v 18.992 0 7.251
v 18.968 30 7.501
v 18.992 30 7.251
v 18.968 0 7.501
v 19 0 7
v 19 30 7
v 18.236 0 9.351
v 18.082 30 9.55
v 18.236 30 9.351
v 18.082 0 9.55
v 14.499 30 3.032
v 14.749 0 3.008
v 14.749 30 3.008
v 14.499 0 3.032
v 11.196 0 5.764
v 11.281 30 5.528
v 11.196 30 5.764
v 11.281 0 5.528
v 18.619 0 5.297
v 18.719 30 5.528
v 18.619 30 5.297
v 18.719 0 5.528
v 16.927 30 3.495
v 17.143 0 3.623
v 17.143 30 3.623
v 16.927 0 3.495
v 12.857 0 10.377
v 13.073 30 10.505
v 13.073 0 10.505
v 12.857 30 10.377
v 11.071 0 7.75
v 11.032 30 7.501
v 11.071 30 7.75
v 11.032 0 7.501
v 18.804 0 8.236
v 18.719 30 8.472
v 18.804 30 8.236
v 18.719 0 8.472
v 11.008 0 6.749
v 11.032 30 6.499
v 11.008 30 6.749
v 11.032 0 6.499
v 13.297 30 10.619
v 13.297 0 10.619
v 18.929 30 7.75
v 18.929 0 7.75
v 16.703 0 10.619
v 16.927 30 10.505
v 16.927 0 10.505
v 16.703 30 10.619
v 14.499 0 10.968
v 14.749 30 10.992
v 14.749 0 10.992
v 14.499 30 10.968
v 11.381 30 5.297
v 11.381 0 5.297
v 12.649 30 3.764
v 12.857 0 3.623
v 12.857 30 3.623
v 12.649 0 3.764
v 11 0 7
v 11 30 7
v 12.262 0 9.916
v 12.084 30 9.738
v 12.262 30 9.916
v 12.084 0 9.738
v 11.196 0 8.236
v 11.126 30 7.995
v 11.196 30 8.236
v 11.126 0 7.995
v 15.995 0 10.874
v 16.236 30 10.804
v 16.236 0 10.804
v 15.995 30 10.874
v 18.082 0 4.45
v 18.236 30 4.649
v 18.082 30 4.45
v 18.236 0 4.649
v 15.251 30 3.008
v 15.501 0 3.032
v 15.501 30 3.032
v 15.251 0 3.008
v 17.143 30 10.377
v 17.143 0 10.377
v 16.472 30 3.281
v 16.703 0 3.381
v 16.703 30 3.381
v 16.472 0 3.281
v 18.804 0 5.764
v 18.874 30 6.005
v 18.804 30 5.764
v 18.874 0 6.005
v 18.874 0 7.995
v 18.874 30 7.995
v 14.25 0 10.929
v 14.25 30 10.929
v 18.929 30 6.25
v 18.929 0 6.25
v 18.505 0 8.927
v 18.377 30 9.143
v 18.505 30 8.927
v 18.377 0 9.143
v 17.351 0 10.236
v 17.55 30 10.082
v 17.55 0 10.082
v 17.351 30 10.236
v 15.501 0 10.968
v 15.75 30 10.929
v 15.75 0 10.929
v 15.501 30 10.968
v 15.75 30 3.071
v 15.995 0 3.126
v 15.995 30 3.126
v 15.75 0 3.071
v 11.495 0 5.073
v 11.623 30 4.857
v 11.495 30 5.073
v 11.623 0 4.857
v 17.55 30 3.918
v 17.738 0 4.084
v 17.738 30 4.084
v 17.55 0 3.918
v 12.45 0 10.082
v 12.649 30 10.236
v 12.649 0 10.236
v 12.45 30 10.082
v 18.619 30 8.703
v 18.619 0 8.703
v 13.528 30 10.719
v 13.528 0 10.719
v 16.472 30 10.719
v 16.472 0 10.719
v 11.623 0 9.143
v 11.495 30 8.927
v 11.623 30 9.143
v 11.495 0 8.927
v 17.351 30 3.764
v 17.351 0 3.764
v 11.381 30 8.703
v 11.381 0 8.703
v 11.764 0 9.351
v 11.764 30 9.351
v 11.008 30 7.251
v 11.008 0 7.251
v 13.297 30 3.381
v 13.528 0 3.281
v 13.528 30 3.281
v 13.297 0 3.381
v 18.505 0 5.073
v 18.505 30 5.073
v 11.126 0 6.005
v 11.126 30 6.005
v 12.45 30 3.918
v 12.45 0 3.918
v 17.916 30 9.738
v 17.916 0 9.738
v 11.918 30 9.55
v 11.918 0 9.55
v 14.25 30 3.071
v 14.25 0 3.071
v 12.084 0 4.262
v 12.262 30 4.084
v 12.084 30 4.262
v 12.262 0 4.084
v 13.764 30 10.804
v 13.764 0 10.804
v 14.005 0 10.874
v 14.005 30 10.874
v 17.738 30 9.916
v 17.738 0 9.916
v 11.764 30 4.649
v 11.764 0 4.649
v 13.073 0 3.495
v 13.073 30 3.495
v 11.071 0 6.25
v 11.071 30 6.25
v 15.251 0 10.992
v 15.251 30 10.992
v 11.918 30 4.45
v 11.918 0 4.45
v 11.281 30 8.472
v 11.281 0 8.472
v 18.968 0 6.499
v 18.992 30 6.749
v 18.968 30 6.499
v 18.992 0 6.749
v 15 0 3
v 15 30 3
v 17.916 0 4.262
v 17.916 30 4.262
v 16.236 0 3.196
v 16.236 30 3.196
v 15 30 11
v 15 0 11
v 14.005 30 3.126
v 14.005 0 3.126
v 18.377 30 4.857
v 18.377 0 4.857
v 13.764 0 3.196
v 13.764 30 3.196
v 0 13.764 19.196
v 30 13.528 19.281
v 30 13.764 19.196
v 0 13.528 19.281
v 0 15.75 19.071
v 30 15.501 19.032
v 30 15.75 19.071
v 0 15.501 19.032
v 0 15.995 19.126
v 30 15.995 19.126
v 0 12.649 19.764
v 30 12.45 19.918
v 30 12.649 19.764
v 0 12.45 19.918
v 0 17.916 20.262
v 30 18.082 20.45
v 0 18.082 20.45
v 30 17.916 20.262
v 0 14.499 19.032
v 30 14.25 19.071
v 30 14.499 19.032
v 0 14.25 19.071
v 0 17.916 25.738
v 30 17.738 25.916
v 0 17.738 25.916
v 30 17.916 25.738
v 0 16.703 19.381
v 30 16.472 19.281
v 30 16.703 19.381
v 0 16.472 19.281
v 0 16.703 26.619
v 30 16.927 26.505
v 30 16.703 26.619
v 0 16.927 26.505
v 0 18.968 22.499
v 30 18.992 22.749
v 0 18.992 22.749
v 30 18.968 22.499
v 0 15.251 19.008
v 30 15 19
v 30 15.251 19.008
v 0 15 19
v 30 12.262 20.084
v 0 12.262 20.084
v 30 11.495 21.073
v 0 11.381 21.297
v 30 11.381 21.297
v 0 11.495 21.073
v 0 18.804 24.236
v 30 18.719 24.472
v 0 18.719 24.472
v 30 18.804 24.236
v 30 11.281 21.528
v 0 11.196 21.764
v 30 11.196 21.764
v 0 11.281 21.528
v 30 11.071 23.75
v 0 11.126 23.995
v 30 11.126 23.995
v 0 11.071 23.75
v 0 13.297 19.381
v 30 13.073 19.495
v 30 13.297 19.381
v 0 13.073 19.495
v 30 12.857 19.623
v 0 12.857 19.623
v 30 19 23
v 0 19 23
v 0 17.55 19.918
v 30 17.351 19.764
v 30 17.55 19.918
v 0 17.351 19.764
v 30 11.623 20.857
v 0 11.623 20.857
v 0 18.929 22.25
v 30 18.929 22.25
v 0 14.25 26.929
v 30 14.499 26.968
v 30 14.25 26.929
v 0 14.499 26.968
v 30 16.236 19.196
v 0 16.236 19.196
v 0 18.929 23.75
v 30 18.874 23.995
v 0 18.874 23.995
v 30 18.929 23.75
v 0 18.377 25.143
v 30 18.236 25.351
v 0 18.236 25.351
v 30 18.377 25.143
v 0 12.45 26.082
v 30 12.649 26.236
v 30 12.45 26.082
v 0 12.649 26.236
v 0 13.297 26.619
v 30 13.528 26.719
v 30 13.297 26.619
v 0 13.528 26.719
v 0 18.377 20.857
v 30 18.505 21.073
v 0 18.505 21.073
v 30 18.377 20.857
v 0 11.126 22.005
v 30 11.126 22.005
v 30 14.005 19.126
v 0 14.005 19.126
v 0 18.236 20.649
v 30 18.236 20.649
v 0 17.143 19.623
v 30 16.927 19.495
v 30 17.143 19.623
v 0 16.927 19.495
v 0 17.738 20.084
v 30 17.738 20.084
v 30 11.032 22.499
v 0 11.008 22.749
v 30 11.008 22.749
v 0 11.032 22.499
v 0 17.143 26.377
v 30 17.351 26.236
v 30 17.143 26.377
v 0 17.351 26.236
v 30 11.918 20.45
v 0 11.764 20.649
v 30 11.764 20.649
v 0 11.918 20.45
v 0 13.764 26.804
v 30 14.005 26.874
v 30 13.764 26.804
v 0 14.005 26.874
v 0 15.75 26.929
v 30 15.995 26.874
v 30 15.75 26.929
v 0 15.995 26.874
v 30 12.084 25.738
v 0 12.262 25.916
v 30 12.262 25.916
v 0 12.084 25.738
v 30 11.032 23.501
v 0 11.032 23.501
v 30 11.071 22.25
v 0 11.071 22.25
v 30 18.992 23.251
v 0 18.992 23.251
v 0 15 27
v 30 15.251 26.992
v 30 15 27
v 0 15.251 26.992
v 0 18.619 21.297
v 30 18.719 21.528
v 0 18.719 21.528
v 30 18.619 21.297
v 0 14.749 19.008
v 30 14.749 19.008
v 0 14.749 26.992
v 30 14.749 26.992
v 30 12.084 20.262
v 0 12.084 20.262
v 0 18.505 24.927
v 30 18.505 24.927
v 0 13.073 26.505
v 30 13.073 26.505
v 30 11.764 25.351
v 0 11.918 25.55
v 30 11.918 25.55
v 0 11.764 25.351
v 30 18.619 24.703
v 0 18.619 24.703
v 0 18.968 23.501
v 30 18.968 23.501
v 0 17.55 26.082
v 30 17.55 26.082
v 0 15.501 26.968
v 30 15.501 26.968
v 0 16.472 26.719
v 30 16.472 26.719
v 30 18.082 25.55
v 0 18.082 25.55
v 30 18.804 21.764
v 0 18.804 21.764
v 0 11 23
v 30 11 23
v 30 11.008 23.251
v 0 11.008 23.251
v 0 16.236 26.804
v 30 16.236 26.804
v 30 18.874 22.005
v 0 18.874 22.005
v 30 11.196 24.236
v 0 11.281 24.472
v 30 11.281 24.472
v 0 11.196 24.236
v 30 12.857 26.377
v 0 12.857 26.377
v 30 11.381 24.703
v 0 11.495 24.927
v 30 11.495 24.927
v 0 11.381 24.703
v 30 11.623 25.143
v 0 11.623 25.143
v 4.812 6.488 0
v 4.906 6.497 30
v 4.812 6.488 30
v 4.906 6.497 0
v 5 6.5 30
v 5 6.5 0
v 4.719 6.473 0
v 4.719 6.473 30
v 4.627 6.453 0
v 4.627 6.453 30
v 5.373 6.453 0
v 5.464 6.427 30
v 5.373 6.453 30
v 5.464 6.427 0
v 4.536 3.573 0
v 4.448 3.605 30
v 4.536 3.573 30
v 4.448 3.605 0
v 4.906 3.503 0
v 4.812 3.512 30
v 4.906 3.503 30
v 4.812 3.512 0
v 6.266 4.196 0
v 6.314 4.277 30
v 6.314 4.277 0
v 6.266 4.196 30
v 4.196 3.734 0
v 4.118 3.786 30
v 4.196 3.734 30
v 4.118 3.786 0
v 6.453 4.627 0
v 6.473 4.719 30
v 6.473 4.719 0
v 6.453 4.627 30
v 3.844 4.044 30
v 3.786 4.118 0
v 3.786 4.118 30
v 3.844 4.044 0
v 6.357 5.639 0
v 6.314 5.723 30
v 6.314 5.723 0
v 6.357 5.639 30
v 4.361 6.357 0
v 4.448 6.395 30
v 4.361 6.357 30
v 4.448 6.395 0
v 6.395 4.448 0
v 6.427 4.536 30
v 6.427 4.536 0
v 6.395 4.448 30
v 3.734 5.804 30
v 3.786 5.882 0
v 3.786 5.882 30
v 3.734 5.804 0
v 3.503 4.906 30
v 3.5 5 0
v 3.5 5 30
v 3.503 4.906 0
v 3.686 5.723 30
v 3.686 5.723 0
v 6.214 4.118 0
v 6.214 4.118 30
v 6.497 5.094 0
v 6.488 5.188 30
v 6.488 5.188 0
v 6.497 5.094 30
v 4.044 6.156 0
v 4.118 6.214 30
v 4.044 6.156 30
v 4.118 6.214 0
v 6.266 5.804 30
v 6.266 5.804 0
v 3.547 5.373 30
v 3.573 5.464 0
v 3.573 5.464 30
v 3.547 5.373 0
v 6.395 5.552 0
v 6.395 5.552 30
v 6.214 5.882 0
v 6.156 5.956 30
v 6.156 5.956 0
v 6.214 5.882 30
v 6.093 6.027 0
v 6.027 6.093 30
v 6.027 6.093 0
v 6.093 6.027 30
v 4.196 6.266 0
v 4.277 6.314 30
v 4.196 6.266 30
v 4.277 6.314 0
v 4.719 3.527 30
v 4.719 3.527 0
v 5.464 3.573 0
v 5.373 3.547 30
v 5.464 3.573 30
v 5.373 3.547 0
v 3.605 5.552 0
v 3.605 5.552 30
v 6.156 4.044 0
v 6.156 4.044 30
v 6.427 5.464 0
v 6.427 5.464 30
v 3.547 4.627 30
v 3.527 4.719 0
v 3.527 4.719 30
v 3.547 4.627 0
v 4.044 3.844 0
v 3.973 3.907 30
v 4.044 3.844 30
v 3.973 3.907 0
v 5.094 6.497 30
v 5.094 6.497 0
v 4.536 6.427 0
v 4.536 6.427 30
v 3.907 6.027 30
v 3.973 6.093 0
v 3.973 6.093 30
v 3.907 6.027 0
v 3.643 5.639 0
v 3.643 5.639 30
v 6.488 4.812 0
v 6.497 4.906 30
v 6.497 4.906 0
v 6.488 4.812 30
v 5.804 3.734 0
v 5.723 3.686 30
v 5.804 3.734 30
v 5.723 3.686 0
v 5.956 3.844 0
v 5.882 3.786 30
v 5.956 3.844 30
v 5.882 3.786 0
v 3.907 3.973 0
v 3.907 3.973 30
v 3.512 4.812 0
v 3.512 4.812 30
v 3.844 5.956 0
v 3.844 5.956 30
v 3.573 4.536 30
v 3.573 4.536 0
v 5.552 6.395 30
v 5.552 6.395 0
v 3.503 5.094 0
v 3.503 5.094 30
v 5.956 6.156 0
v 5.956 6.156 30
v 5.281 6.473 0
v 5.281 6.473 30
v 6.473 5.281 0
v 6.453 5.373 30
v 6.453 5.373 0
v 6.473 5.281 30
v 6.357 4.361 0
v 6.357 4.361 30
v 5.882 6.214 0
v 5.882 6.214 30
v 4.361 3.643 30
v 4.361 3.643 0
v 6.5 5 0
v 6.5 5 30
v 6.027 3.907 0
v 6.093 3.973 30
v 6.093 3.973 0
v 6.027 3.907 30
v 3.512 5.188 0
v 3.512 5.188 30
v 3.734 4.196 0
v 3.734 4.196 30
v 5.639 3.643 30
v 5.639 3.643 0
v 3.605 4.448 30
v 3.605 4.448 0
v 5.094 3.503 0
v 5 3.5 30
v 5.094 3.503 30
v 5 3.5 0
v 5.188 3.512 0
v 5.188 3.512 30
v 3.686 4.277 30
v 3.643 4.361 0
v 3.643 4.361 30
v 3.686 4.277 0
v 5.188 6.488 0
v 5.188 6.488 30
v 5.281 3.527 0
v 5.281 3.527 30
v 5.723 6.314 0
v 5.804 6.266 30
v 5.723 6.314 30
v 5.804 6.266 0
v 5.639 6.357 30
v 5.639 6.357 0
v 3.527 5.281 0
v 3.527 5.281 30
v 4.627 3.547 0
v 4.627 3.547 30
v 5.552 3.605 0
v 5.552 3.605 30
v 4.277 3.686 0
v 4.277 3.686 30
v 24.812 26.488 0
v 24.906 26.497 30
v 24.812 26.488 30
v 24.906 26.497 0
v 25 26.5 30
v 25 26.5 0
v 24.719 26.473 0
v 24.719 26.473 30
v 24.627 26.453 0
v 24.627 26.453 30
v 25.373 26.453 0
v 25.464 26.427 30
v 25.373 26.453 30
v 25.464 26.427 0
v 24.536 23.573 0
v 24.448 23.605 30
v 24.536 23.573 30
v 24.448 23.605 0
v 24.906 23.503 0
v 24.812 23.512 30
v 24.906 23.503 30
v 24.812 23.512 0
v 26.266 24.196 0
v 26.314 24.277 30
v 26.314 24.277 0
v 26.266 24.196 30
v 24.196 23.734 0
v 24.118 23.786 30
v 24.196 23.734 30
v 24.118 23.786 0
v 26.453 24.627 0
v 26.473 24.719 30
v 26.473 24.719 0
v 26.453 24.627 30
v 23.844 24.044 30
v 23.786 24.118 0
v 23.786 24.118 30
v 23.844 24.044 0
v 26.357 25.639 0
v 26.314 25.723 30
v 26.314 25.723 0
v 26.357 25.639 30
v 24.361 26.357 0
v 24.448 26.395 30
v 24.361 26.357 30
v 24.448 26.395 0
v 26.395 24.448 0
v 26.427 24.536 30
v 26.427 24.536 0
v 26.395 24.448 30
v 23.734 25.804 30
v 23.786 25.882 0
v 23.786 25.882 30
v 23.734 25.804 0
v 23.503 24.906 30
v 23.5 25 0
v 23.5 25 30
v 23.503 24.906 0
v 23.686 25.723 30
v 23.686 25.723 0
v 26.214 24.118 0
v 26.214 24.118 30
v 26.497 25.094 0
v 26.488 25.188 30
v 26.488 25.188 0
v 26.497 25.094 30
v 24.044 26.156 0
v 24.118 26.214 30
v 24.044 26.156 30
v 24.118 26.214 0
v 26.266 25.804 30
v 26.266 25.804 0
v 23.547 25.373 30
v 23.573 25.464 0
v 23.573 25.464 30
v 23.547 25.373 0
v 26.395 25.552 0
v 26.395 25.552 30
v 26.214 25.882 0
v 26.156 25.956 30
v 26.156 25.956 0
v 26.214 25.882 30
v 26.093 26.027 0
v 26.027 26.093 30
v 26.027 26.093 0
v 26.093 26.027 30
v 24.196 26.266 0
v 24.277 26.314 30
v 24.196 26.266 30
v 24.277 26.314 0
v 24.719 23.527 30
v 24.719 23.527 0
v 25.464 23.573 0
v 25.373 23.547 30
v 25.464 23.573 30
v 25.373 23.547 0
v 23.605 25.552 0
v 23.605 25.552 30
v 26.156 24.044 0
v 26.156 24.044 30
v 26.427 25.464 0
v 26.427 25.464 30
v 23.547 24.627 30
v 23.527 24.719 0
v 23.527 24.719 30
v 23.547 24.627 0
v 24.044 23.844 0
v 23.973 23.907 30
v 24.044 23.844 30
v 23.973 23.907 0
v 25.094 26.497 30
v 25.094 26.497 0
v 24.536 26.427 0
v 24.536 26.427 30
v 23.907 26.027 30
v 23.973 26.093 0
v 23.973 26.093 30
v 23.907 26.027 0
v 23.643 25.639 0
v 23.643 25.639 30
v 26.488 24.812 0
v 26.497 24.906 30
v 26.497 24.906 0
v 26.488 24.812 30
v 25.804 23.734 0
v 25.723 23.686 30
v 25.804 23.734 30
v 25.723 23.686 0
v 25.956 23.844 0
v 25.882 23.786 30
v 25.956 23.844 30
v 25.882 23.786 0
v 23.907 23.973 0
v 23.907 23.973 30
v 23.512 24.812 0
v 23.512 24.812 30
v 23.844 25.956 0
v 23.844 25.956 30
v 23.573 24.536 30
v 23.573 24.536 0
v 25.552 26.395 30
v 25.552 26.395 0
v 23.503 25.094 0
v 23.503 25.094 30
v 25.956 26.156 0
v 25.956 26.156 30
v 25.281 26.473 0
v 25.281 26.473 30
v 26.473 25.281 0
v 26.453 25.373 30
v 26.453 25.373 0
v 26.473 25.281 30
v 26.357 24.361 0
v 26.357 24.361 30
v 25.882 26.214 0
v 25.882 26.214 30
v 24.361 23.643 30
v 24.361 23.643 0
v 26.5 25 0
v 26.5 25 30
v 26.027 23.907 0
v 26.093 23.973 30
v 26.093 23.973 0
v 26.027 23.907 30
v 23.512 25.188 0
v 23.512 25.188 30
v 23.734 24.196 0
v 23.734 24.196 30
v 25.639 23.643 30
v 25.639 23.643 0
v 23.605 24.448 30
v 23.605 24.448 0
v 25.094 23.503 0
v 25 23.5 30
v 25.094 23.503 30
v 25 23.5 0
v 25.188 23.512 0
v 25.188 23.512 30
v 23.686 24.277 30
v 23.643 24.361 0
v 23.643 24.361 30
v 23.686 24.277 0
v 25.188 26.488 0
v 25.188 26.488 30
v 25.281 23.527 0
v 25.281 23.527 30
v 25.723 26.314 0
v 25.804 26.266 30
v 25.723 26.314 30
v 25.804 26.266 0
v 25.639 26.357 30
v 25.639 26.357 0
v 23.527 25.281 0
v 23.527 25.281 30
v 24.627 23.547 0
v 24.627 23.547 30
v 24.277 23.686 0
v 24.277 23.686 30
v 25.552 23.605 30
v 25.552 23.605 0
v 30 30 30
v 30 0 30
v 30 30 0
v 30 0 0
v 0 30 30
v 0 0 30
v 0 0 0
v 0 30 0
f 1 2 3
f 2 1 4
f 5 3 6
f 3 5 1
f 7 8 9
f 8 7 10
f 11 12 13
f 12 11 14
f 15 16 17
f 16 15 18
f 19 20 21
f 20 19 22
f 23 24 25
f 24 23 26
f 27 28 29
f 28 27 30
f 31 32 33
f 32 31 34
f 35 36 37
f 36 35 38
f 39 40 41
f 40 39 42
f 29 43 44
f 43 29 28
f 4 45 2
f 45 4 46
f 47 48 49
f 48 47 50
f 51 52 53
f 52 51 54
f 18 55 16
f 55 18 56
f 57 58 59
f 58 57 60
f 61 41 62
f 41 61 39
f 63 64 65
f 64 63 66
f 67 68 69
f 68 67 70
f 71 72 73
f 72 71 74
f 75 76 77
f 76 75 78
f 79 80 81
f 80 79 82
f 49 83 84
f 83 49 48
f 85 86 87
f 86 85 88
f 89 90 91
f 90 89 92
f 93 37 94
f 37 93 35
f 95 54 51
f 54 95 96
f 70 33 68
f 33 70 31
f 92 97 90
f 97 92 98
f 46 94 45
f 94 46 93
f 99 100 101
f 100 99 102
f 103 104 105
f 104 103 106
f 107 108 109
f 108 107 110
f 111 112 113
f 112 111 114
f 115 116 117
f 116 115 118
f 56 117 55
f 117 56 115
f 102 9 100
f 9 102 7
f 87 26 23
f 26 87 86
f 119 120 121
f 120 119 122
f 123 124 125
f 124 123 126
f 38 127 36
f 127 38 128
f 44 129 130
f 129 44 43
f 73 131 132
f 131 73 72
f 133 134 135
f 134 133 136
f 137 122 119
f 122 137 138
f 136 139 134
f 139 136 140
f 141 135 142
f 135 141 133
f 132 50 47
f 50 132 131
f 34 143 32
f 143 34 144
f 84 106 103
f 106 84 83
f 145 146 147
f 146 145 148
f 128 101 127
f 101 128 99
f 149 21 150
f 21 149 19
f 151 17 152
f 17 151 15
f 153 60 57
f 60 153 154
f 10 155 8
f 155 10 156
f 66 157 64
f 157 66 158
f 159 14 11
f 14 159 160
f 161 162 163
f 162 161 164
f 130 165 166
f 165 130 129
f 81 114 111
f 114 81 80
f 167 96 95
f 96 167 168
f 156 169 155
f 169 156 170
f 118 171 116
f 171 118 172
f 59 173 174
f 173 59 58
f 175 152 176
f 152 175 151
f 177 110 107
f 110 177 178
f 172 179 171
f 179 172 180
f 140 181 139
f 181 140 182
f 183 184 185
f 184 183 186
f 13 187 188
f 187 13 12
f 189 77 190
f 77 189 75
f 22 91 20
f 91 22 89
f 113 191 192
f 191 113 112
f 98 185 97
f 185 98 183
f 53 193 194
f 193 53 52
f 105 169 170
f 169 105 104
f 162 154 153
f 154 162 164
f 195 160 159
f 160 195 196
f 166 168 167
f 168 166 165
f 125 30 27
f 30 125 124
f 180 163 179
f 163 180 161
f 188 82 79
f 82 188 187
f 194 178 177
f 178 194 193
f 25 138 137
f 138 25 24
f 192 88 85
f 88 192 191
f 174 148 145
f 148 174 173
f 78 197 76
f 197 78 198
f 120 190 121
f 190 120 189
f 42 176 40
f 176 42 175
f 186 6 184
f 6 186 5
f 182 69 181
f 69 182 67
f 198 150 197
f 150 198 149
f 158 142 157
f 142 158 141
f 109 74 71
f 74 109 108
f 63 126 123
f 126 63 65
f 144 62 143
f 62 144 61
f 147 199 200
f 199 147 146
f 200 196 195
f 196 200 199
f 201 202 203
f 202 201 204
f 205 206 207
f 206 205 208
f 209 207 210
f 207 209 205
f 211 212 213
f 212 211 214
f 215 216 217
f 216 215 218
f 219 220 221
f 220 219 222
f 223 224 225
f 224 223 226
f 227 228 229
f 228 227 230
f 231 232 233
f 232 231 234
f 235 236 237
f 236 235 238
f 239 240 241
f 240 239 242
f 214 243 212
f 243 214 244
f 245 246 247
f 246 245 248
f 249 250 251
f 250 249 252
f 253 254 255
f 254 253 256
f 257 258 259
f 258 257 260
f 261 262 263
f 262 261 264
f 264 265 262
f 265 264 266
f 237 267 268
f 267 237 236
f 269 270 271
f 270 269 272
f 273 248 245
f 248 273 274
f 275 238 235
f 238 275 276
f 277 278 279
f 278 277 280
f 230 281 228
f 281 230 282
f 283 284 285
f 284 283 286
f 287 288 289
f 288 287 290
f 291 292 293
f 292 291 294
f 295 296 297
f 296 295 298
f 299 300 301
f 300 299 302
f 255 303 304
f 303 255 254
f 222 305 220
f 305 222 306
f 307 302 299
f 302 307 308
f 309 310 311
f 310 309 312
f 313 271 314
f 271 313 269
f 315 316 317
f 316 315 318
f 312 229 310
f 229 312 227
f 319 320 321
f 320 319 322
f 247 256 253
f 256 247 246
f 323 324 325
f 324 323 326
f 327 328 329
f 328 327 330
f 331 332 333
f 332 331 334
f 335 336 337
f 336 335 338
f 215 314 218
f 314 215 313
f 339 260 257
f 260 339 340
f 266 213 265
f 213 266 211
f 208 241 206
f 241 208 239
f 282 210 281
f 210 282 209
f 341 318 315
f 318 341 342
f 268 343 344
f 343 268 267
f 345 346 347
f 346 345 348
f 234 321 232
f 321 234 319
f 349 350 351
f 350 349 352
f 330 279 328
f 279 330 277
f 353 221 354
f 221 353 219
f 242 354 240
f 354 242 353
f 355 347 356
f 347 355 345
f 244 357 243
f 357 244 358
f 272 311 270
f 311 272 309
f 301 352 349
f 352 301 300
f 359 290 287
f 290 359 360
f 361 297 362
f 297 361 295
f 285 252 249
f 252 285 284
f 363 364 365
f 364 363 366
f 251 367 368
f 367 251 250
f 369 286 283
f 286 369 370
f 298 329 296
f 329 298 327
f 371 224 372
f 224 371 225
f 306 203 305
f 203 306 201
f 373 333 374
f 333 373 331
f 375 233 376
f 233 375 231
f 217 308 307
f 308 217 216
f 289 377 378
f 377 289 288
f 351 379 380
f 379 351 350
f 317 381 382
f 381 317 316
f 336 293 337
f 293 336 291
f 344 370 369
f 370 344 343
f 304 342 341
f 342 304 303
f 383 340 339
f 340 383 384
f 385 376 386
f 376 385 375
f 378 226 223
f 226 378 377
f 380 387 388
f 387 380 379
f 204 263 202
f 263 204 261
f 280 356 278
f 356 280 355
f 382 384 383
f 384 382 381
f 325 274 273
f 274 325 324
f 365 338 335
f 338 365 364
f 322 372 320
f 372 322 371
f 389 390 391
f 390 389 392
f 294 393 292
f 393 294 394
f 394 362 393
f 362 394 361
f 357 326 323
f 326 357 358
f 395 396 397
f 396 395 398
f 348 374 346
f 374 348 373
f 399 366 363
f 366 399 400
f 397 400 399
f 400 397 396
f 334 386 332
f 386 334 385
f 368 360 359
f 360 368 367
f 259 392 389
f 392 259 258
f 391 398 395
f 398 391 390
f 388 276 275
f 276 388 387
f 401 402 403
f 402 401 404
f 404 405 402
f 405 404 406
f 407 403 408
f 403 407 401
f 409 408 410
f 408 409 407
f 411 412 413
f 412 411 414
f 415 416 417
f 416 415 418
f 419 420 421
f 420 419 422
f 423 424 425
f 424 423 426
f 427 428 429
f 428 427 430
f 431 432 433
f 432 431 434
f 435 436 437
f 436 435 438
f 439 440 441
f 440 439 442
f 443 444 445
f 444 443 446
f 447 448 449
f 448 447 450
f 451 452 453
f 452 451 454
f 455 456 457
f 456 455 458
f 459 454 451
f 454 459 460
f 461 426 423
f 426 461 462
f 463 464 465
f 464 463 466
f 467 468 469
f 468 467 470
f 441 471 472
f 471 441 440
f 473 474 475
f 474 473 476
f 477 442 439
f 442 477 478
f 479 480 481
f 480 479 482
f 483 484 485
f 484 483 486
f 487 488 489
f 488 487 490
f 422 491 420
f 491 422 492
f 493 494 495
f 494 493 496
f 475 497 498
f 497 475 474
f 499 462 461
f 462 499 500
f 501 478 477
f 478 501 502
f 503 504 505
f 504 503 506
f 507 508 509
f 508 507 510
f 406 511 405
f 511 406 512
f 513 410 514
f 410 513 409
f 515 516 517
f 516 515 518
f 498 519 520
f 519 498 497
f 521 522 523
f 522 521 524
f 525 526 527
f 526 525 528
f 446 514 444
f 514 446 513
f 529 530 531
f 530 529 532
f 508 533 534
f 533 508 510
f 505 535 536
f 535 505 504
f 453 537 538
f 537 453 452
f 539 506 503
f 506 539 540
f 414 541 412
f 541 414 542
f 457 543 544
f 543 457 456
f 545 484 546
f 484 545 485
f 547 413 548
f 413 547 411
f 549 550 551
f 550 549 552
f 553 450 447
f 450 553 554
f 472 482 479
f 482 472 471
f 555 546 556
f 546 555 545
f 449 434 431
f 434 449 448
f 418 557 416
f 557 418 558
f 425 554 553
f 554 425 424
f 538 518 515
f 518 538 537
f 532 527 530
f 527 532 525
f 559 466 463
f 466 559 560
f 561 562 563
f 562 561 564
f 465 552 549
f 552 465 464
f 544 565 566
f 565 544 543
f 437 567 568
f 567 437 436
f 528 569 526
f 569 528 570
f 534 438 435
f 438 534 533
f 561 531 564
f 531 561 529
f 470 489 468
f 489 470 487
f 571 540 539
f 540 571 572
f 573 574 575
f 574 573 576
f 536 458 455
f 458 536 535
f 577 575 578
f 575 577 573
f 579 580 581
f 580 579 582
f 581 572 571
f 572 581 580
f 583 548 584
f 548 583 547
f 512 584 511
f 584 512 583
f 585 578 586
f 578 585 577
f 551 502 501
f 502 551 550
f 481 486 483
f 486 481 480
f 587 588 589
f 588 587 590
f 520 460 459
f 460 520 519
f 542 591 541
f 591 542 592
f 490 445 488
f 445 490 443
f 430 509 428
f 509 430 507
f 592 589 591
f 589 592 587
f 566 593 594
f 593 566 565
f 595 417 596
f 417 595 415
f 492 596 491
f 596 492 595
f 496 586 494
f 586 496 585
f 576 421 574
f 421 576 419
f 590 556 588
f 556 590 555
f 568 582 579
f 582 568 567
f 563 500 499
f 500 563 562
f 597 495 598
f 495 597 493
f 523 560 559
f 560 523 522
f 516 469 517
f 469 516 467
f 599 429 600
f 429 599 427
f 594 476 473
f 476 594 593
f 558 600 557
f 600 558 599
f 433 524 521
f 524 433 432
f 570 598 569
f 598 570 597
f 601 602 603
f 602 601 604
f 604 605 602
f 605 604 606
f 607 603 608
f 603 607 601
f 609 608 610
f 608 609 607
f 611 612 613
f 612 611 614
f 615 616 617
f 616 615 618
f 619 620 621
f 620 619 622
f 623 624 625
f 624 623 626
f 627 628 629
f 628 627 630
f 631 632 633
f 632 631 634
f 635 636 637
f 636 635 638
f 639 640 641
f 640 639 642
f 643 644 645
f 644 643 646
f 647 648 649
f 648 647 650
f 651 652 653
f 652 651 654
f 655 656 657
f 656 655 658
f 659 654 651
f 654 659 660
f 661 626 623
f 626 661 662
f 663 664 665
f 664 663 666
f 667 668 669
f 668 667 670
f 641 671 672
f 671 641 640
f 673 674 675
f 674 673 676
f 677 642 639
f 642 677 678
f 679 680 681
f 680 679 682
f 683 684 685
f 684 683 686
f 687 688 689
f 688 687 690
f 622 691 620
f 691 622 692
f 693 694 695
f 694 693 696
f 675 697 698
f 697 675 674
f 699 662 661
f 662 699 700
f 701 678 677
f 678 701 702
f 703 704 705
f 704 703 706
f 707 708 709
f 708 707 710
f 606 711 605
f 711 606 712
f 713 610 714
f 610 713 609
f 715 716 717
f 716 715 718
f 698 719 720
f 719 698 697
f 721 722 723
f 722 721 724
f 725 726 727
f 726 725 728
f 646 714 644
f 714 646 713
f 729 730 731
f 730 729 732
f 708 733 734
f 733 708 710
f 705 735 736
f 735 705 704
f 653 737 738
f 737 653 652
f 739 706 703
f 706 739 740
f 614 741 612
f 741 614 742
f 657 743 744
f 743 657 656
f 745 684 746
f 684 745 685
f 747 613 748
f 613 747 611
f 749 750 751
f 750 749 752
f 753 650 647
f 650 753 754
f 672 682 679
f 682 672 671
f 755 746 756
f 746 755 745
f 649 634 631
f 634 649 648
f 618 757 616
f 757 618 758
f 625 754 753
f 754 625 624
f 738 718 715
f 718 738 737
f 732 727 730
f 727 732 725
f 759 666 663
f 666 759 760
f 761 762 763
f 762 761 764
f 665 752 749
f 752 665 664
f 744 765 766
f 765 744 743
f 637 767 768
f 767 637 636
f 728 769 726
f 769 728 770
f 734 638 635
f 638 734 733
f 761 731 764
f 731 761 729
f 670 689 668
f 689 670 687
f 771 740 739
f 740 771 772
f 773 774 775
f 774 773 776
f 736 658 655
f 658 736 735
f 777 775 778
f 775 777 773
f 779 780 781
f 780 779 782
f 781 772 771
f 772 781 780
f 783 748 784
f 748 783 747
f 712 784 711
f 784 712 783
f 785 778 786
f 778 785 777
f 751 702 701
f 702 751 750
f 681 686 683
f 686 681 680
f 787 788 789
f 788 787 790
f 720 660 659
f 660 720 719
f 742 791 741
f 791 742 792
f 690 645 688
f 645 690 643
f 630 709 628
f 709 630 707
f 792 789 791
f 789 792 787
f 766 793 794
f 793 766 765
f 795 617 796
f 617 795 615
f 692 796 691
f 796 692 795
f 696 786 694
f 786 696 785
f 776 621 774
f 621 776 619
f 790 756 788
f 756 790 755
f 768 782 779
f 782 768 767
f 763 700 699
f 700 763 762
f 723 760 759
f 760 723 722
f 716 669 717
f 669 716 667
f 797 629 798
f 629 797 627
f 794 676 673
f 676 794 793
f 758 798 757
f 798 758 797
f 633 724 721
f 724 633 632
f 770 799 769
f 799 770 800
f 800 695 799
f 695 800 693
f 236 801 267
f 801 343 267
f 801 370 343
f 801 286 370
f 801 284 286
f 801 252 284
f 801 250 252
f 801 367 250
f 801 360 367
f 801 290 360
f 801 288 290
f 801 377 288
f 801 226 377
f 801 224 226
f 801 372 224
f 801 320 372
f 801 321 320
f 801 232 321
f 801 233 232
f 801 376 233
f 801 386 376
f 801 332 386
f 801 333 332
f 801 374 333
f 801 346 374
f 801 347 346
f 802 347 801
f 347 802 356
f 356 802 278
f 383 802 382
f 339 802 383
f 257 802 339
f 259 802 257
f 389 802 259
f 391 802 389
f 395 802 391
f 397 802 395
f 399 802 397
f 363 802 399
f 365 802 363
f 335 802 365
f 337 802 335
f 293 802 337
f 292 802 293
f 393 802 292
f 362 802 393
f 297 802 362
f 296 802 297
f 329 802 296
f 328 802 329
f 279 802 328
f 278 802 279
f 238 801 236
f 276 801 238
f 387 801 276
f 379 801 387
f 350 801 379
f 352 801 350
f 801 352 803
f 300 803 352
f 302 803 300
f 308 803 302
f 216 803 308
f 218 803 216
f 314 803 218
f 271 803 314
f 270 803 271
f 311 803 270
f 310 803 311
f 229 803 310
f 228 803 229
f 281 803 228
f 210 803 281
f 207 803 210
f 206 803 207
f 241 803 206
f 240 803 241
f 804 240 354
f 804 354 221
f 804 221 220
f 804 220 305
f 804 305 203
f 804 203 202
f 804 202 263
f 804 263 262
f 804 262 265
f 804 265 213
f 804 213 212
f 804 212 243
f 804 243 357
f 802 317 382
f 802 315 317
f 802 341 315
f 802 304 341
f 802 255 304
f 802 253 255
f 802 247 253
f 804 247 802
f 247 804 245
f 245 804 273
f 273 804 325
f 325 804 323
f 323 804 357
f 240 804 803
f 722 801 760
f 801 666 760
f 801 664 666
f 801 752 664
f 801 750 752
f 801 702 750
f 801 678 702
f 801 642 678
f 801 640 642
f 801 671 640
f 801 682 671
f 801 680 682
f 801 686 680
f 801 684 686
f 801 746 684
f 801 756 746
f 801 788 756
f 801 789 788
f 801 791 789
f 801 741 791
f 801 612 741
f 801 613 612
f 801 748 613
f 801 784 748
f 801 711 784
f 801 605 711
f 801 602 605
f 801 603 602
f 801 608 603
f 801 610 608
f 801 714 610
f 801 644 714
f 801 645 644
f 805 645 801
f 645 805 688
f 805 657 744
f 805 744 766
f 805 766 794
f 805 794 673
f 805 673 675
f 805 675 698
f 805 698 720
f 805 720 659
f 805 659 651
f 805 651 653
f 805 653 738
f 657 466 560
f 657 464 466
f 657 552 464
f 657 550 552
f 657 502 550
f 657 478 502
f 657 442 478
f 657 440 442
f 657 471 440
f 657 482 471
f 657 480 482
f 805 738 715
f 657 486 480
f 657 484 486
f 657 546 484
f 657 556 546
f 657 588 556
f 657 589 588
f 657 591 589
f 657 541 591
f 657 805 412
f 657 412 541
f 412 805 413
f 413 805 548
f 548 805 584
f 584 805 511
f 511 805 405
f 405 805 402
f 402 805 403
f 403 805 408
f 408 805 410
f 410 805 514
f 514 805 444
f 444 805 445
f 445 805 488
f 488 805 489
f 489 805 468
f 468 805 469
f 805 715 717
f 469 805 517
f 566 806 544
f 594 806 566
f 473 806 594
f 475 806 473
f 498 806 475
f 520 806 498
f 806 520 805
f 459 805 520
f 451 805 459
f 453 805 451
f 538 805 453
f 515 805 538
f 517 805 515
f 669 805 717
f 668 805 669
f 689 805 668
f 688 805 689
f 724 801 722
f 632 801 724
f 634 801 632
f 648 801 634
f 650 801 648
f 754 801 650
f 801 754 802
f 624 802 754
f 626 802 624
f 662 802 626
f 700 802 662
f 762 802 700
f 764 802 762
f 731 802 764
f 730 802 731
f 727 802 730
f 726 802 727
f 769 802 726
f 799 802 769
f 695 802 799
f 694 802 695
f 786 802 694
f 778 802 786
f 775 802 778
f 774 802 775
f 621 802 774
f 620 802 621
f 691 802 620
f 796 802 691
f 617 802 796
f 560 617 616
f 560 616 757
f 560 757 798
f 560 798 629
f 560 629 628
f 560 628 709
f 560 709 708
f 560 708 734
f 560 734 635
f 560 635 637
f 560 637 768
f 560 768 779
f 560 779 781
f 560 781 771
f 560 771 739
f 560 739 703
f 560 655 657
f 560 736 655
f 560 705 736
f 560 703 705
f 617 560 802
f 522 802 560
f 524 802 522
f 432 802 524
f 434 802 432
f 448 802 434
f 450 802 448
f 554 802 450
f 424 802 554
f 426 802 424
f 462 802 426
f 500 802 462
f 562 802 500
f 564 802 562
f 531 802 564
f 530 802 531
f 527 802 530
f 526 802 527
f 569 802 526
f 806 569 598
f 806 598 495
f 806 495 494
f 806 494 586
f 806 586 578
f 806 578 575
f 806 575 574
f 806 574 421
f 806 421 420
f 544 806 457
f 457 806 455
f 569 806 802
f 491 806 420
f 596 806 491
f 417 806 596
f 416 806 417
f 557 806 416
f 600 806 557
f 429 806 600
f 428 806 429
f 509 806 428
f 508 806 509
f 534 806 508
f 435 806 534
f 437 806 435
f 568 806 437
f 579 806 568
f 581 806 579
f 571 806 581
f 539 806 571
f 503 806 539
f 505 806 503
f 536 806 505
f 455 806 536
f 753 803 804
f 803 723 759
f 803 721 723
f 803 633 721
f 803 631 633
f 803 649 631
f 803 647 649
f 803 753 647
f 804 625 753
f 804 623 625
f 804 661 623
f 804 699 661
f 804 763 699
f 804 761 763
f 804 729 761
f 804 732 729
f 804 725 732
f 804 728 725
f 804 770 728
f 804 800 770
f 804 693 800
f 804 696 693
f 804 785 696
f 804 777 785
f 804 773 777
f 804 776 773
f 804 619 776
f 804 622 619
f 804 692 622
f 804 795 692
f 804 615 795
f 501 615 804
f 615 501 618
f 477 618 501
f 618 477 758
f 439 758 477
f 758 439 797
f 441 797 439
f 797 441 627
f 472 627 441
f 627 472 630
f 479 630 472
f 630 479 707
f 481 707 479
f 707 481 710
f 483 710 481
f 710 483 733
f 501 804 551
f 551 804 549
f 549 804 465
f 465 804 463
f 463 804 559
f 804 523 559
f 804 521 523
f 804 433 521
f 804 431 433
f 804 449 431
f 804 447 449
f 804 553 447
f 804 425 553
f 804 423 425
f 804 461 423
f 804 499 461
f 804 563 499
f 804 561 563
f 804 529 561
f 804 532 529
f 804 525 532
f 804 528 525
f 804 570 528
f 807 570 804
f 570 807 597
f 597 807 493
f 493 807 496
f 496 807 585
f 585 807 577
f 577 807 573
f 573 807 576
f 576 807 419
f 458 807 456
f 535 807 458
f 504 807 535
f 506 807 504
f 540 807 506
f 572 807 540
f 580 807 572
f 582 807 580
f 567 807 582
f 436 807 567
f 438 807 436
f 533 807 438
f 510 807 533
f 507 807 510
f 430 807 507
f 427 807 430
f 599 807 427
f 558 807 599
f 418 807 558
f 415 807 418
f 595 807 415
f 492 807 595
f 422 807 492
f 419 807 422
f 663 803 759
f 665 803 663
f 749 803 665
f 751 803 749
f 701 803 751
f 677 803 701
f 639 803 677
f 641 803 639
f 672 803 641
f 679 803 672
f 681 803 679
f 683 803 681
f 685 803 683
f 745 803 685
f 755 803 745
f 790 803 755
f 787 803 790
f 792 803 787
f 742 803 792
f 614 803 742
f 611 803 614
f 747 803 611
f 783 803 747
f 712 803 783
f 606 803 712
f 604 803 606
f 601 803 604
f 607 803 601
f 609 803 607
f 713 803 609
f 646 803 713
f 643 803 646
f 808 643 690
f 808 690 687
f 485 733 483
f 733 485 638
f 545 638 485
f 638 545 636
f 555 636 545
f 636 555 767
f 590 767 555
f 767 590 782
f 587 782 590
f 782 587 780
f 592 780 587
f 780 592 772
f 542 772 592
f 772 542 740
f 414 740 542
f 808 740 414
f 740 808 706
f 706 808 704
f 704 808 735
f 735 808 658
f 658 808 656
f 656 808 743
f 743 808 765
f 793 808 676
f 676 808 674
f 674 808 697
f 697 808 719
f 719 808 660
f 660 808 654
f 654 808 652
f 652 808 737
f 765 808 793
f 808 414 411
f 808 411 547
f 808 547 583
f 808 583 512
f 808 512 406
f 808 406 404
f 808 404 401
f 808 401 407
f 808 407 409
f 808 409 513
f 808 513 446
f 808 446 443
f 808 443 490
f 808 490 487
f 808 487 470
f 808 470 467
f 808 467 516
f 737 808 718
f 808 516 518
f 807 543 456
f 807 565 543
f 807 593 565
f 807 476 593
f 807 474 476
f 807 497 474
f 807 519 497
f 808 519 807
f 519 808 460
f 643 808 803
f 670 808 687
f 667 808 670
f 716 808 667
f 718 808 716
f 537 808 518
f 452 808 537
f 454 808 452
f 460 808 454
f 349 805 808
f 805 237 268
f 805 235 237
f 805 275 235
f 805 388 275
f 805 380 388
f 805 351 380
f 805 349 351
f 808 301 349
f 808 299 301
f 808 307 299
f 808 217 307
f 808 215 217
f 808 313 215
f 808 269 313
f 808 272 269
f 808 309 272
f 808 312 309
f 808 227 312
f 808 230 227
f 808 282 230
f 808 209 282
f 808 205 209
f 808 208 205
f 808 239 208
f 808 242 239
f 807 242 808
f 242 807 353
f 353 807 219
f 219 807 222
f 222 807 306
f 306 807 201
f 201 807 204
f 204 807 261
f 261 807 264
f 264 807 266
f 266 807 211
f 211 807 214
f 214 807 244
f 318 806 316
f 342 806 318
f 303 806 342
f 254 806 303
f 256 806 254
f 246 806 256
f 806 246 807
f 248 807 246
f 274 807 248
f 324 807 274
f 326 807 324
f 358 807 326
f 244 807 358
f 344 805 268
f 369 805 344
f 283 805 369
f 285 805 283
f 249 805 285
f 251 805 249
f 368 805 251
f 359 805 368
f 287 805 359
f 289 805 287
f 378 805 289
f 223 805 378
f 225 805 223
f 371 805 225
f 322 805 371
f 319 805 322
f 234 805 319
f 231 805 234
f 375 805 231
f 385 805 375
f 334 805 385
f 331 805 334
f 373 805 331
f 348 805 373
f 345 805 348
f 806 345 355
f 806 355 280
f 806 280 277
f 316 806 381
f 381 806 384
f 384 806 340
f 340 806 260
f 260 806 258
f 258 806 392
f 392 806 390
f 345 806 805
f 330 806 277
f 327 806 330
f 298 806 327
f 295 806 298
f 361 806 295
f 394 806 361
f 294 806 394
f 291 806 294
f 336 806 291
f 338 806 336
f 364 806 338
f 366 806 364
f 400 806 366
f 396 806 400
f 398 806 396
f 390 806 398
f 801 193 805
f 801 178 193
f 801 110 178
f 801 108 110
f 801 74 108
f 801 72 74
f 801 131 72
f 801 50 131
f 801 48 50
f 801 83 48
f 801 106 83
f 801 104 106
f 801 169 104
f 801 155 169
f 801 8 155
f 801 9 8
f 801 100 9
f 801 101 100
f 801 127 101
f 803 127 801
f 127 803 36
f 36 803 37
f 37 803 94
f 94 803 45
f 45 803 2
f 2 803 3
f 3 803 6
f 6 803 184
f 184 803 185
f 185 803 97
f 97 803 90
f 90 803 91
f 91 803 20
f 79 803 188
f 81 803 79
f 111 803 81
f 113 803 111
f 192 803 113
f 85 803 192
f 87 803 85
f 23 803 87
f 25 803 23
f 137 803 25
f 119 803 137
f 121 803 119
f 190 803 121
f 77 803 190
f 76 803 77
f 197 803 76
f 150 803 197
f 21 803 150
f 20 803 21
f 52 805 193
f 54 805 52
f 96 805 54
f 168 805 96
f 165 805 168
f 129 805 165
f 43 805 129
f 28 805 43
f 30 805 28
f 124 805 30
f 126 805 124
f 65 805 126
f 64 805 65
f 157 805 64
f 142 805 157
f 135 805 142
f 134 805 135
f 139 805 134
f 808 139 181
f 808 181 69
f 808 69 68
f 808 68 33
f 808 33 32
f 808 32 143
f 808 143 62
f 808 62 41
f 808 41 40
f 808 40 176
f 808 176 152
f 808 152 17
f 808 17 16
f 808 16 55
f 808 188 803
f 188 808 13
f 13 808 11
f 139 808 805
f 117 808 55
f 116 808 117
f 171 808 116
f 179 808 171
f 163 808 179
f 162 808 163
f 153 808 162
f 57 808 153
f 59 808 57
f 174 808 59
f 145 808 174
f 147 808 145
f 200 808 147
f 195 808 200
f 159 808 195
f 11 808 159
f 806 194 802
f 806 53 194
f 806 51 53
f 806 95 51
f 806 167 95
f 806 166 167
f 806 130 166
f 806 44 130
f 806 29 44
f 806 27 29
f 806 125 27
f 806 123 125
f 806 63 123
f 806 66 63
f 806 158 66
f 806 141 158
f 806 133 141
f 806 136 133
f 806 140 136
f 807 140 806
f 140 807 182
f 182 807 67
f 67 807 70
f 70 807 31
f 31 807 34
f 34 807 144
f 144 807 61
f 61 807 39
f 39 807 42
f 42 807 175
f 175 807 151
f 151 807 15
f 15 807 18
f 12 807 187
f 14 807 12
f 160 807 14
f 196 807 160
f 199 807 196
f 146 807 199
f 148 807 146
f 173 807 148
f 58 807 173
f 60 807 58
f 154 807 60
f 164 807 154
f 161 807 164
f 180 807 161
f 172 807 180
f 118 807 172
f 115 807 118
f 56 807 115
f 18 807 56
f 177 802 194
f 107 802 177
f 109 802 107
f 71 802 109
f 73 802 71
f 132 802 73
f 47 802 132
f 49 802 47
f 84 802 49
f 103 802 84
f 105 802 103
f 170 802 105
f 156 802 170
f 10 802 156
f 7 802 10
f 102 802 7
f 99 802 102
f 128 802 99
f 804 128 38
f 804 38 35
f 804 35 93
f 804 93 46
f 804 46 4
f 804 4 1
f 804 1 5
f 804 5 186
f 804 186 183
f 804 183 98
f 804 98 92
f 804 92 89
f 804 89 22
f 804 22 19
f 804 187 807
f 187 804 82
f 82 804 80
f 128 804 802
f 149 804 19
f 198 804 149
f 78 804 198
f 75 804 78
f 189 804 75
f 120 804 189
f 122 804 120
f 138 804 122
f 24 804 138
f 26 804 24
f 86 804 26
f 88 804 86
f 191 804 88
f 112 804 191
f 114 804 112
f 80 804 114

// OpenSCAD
difference(){
	union(){ 

        translate([0,0,0]){
           cube([30,30,30], center=false);
        }                

	}
	union() {
        translate([15,0,7]){
            rotate([90,0,0]){
                cylinder(h=200, r=4, $fn=100, center=true);
            }   
        }
        translate([15,15,7+8+8]){
            rotate([0,90,0]){
                cylinder(h=200, r=4, $fn=100, center=true);
            }   
        }
        translate([5,5,0]){
            rotate([0,0,90]){
                cylinder(h=200, r=1.5, $fn=100, center=true);
            }   
        }
        translate([25,25,0]){
            rotate([0,0,90]){
                cylinder(h=200, r=1.5, $fn=100, center=true);
            }   
        }
	}
}
